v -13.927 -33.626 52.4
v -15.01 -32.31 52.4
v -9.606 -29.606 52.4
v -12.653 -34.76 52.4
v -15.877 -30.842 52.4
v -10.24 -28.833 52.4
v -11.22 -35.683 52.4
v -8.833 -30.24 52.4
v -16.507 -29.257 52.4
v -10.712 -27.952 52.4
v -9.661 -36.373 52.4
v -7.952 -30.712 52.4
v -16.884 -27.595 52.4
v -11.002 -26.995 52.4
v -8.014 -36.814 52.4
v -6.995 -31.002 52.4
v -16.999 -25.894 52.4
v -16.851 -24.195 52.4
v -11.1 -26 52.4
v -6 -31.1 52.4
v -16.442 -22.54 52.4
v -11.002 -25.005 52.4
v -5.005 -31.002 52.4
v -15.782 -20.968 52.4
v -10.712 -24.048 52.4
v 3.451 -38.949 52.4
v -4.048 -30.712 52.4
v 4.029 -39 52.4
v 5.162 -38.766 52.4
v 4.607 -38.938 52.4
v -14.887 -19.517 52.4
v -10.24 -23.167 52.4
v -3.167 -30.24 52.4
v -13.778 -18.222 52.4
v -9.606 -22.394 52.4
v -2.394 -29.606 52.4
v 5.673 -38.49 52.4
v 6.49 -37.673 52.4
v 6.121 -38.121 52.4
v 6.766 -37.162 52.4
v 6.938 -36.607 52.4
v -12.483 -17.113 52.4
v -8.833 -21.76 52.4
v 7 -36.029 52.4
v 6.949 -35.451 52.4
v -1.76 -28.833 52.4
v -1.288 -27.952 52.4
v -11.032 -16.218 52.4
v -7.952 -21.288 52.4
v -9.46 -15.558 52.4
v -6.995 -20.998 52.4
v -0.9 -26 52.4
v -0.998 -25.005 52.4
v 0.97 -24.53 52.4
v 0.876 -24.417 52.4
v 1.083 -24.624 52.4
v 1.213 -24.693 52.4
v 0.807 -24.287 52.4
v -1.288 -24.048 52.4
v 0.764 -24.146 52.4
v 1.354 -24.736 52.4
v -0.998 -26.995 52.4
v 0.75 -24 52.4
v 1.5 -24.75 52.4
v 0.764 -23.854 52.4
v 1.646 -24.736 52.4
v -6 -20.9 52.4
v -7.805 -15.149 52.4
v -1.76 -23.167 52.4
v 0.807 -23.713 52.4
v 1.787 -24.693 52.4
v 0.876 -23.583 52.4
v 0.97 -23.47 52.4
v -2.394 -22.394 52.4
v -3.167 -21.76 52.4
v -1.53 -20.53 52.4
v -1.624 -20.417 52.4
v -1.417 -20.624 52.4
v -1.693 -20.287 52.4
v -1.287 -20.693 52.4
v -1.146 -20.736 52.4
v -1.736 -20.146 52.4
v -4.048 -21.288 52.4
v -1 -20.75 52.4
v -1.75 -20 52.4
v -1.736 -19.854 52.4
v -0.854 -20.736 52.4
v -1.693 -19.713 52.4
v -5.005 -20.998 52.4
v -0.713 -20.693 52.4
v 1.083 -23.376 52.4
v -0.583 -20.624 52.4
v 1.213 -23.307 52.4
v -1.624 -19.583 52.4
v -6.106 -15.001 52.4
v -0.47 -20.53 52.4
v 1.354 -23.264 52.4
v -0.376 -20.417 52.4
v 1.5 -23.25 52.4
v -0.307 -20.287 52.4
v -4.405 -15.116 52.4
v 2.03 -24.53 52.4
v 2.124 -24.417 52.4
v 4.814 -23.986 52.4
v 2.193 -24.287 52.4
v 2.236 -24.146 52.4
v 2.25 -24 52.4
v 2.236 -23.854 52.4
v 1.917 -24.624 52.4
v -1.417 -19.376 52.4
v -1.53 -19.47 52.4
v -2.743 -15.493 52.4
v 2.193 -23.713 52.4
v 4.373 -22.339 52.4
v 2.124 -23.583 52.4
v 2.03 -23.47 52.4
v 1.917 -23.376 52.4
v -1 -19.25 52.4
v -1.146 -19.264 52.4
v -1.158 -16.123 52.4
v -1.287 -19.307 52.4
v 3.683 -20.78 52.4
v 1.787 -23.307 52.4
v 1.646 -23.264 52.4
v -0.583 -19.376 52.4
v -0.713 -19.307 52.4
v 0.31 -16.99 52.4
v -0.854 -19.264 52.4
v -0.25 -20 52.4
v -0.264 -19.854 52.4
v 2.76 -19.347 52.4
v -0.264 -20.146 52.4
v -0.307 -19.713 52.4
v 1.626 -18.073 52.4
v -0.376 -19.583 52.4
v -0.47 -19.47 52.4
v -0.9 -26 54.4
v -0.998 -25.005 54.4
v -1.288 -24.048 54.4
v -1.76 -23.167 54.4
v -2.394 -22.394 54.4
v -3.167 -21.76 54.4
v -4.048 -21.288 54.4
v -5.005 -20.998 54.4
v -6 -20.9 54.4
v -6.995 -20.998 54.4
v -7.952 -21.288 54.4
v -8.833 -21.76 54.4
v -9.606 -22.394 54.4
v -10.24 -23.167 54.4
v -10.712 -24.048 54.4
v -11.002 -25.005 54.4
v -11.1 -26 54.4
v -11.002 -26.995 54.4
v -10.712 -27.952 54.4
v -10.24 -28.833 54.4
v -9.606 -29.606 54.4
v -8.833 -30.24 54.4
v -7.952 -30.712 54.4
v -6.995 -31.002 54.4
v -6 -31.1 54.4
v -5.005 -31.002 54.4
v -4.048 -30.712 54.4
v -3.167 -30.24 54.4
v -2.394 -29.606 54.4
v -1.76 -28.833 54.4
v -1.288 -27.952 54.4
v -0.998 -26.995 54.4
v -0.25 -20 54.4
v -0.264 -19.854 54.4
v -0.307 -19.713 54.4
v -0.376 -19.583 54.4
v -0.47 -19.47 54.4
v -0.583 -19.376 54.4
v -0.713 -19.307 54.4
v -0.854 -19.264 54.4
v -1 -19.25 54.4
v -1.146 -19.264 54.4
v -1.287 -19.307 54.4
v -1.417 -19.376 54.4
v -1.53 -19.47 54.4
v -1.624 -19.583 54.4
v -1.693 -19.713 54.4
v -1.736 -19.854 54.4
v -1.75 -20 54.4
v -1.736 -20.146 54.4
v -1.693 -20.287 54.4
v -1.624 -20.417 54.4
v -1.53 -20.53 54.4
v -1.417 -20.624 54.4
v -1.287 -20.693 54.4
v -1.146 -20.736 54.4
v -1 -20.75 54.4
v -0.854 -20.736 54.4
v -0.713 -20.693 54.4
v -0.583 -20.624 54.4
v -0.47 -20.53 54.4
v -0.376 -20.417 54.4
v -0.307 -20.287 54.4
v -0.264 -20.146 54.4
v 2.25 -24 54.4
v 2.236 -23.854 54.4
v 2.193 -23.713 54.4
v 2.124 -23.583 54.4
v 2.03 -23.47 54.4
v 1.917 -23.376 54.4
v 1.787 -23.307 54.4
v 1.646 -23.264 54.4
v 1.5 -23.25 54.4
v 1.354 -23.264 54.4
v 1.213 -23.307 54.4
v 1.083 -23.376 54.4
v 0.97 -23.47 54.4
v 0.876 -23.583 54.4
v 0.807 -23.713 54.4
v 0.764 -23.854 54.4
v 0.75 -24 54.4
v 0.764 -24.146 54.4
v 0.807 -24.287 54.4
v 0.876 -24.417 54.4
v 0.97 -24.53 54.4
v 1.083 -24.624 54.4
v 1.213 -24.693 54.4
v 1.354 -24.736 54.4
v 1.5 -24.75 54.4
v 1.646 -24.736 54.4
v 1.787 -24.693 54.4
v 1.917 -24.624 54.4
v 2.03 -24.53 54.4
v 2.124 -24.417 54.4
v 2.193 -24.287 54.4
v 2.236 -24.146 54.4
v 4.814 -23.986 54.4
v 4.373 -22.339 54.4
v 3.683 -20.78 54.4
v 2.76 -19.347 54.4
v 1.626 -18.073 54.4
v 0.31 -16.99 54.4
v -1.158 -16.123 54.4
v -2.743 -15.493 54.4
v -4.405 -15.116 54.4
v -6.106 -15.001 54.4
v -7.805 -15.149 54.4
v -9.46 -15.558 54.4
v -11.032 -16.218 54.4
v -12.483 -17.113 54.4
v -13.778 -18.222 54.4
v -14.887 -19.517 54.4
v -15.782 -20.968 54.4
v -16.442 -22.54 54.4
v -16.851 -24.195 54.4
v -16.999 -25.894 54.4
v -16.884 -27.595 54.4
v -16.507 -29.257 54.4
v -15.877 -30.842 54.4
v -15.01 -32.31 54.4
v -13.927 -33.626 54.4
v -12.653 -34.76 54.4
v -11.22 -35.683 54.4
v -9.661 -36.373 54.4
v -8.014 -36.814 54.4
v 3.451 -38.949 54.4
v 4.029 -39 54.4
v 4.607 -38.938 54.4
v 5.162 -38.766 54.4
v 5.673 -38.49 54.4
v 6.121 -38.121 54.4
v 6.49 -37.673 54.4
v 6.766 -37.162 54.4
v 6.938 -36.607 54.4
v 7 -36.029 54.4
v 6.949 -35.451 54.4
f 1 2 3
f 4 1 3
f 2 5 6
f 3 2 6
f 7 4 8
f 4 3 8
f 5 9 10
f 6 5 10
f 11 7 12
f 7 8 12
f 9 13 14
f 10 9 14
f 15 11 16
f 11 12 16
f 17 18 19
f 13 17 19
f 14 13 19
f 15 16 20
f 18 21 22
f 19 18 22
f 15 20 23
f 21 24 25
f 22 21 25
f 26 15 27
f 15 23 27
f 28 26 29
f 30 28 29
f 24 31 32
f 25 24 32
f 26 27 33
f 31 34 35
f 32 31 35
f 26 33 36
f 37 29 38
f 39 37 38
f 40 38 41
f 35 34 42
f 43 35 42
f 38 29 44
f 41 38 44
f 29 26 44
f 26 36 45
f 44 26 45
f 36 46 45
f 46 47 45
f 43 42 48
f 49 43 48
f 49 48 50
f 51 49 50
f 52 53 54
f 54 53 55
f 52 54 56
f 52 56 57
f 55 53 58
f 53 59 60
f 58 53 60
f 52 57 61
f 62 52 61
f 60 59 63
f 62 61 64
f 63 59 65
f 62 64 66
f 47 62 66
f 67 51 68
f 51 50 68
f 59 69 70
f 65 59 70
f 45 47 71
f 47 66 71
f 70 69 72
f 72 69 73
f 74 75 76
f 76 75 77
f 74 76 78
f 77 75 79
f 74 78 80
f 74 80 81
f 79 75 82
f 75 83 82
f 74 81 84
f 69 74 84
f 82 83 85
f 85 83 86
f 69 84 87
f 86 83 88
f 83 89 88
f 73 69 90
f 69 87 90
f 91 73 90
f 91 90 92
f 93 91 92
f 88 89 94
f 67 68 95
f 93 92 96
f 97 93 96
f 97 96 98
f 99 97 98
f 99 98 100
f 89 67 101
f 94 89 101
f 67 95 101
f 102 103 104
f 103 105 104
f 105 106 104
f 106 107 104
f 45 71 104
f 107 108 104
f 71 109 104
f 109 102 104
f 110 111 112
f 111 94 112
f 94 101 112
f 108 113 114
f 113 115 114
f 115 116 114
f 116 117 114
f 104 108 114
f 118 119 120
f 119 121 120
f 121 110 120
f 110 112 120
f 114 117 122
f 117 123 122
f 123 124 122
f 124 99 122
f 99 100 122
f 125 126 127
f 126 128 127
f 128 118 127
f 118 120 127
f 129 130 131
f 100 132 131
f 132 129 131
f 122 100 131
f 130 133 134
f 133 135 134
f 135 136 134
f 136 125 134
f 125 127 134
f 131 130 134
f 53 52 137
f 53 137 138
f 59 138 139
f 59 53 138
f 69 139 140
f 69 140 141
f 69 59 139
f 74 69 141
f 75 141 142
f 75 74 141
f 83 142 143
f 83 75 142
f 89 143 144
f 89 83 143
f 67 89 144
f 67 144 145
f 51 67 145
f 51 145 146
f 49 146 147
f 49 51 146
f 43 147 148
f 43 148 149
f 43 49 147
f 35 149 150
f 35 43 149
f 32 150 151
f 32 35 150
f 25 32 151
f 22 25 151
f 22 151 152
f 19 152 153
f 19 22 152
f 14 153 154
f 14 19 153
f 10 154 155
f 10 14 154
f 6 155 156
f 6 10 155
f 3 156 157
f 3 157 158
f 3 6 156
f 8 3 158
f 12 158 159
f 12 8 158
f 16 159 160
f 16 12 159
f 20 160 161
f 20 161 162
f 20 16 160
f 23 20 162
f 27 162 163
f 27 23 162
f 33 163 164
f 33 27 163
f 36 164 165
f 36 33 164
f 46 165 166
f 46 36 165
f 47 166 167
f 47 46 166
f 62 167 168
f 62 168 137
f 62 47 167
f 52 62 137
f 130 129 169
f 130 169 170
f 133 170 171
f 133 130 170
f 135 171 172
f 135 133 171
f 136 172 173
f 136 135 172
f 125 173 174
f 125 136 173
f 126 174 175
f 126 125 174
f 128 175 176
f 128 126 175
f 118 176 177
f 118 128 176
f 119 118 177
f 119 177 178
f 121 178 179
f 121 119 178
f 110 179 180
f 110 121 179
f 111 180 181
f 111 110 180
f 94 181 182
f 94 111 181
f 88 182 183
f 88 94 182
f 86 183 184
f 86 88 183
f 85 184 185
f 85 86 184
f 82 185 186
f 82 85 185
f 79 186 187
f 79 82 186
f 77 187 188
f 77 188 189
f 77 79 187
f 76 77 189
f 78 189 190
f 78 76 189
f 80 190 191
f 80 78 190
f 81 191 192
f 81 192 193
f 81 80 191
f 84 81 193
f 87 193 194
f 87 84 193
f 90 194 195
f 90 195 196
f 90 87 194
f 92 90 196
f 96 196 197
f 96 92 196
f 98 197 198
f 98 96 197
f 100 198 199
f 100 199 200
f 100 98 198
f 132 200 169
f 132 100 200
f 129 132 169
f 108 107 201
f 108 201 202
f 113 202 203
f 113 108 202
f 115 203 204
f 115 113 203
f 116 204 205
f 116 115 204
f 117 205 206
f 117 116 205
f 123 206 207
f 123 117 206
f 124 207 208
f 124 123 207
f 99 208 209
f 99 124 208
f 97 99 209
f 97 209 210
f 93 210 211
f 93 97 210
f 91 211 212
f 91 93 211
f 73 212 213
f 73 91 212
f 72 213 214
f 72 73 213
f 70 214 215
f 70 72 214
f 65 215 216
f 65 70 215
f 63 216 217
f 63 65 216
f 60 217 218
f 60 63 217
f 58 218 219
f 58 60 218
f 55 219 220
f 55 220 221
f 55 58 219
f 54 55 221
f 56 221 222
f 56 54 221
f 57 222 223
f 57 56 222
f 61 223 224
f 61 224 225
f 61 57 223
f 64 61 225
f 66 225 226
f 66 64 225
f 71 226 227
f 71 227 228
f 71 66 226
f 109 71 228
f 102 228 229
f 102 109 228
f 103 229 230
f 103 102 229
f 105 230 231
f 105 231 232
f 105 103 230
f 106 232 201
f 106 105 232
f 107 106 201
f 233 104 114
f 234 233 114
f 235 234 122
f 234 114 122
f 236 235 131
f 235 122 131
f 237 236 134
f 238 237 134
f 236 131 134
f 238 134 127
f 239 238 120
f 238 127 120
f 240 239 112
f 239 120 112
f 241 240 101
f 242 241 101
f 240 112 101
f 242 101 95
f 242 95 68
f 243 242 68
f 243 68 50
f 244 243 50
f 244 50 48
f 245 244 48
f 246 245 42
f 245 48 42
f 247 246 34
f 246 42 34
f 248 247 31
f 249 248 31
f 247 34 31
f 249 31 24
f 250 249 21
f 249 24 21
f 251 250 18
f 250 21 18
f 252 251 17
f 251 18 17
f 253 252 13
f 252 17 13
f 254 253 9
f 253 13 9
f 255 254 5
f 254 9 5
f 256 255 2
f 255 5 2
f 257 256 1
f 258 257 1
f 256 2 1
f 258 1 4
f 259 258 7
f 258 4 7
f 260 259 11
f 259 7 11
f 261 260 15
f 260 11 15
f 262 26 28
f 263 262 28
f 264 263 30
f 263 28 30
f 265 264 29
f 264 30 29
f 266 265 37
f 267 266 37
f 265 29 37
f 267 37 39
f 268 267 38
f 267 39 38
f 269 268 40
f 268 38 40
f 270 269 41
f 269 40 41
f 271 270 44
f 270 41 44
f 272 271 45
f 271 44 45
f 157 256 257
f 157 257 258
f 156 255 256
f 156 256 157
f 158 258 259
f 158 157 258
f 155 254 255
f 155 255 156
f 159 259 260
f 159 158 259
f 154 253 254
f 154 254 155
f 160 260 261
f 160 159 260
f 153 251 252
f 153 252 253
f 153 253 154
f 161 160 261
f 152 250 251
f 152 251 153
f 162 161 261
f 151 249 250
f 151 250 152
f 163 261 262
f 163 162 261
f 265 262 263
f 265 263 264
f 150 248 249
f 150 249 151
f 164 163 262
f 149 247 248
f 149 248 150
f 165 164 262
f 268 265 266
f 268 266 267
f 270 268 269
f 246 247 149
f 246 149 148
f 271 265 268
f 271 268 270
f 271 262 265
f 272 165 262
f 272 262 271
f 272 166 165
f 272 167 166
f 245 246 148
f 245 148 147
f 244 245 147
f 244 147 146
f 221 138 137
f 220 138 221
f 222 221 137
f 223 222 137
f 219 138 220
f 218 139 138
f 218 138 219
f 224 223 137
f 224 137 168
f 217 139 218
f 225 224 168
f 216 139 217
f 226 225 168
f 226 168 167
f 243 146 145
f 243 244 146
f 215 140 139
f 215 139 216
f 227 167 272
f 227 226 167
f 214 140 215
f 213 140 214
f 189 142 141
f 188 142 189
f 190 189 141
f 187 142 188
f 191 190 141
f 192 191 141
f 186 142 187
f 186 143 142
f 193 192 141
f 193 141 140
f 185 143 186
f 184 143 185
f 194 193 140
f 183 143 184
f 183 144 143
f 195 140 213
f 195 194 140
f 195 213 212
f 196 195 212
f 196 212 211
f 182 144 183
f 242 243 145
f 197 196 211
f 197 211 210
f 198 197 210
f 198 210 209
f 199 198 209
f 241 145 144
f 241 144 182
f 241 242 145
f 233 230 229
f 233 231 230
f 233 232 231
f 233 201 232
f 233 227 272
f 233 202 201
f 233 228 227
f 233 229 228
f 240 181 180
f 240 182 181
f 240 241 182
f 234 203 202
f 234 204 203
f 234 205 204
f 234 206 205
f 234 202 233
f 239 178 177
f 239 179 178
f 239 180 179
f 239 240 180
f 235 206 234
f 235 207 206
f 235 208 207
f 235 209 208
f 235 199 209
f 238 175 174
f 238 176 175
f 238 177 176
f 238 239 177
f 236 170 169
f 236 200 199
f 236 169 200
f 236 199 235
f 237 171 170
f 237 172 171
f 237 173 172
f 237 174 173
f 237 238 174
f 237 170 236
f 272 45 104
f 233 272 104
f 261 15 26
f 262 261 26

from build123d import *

# Parameters (mm, degrees)
SK_PLACA_TOPE_R   = 5.1
SK_PLACA_TOPE_R_2 = 0.75
PLACA_TOPE_DEPTH  = 2


with BuildPart() as part:
    # Sk_Placa_tope → Placa_tope (new body)
    with BuildSketch(Plane.XY.offset(52.4)):
        with BuildLine():
            Line((-8.014047084, -36.814047084), (3.450714432, -38.949285568))
            ThreePointArc((3.450714432, -38.949285568), (6.121320344, -38.121320344), (6.949285568, -35.450714432))
            Line((6.949285568, -35.450714432), (4.814047084, -23.985952916))
            ThreePointArc((4.814047084, -23.985952916), (-13.778174593, -18.221825407), (-8.014047084, -36.814047084))
        make_face()
        with Locations((-6, -26)):
            Circle(SK_PLACA_TOPE_R, mode=Mode.SUBTRACT)
        with Locations((-1, -20)):
            Circle(SK_PLACA_TOPE_R_2, mode=Mode.SUBTRACT)
        with Locations((1.5, -24)):
            Circle(SK_PLACA_TOPE_R_2, mode=Mode.SUBTRACT)
    extrude(amount=PLACA_TOPE_DEPTH)


solid = part.part
